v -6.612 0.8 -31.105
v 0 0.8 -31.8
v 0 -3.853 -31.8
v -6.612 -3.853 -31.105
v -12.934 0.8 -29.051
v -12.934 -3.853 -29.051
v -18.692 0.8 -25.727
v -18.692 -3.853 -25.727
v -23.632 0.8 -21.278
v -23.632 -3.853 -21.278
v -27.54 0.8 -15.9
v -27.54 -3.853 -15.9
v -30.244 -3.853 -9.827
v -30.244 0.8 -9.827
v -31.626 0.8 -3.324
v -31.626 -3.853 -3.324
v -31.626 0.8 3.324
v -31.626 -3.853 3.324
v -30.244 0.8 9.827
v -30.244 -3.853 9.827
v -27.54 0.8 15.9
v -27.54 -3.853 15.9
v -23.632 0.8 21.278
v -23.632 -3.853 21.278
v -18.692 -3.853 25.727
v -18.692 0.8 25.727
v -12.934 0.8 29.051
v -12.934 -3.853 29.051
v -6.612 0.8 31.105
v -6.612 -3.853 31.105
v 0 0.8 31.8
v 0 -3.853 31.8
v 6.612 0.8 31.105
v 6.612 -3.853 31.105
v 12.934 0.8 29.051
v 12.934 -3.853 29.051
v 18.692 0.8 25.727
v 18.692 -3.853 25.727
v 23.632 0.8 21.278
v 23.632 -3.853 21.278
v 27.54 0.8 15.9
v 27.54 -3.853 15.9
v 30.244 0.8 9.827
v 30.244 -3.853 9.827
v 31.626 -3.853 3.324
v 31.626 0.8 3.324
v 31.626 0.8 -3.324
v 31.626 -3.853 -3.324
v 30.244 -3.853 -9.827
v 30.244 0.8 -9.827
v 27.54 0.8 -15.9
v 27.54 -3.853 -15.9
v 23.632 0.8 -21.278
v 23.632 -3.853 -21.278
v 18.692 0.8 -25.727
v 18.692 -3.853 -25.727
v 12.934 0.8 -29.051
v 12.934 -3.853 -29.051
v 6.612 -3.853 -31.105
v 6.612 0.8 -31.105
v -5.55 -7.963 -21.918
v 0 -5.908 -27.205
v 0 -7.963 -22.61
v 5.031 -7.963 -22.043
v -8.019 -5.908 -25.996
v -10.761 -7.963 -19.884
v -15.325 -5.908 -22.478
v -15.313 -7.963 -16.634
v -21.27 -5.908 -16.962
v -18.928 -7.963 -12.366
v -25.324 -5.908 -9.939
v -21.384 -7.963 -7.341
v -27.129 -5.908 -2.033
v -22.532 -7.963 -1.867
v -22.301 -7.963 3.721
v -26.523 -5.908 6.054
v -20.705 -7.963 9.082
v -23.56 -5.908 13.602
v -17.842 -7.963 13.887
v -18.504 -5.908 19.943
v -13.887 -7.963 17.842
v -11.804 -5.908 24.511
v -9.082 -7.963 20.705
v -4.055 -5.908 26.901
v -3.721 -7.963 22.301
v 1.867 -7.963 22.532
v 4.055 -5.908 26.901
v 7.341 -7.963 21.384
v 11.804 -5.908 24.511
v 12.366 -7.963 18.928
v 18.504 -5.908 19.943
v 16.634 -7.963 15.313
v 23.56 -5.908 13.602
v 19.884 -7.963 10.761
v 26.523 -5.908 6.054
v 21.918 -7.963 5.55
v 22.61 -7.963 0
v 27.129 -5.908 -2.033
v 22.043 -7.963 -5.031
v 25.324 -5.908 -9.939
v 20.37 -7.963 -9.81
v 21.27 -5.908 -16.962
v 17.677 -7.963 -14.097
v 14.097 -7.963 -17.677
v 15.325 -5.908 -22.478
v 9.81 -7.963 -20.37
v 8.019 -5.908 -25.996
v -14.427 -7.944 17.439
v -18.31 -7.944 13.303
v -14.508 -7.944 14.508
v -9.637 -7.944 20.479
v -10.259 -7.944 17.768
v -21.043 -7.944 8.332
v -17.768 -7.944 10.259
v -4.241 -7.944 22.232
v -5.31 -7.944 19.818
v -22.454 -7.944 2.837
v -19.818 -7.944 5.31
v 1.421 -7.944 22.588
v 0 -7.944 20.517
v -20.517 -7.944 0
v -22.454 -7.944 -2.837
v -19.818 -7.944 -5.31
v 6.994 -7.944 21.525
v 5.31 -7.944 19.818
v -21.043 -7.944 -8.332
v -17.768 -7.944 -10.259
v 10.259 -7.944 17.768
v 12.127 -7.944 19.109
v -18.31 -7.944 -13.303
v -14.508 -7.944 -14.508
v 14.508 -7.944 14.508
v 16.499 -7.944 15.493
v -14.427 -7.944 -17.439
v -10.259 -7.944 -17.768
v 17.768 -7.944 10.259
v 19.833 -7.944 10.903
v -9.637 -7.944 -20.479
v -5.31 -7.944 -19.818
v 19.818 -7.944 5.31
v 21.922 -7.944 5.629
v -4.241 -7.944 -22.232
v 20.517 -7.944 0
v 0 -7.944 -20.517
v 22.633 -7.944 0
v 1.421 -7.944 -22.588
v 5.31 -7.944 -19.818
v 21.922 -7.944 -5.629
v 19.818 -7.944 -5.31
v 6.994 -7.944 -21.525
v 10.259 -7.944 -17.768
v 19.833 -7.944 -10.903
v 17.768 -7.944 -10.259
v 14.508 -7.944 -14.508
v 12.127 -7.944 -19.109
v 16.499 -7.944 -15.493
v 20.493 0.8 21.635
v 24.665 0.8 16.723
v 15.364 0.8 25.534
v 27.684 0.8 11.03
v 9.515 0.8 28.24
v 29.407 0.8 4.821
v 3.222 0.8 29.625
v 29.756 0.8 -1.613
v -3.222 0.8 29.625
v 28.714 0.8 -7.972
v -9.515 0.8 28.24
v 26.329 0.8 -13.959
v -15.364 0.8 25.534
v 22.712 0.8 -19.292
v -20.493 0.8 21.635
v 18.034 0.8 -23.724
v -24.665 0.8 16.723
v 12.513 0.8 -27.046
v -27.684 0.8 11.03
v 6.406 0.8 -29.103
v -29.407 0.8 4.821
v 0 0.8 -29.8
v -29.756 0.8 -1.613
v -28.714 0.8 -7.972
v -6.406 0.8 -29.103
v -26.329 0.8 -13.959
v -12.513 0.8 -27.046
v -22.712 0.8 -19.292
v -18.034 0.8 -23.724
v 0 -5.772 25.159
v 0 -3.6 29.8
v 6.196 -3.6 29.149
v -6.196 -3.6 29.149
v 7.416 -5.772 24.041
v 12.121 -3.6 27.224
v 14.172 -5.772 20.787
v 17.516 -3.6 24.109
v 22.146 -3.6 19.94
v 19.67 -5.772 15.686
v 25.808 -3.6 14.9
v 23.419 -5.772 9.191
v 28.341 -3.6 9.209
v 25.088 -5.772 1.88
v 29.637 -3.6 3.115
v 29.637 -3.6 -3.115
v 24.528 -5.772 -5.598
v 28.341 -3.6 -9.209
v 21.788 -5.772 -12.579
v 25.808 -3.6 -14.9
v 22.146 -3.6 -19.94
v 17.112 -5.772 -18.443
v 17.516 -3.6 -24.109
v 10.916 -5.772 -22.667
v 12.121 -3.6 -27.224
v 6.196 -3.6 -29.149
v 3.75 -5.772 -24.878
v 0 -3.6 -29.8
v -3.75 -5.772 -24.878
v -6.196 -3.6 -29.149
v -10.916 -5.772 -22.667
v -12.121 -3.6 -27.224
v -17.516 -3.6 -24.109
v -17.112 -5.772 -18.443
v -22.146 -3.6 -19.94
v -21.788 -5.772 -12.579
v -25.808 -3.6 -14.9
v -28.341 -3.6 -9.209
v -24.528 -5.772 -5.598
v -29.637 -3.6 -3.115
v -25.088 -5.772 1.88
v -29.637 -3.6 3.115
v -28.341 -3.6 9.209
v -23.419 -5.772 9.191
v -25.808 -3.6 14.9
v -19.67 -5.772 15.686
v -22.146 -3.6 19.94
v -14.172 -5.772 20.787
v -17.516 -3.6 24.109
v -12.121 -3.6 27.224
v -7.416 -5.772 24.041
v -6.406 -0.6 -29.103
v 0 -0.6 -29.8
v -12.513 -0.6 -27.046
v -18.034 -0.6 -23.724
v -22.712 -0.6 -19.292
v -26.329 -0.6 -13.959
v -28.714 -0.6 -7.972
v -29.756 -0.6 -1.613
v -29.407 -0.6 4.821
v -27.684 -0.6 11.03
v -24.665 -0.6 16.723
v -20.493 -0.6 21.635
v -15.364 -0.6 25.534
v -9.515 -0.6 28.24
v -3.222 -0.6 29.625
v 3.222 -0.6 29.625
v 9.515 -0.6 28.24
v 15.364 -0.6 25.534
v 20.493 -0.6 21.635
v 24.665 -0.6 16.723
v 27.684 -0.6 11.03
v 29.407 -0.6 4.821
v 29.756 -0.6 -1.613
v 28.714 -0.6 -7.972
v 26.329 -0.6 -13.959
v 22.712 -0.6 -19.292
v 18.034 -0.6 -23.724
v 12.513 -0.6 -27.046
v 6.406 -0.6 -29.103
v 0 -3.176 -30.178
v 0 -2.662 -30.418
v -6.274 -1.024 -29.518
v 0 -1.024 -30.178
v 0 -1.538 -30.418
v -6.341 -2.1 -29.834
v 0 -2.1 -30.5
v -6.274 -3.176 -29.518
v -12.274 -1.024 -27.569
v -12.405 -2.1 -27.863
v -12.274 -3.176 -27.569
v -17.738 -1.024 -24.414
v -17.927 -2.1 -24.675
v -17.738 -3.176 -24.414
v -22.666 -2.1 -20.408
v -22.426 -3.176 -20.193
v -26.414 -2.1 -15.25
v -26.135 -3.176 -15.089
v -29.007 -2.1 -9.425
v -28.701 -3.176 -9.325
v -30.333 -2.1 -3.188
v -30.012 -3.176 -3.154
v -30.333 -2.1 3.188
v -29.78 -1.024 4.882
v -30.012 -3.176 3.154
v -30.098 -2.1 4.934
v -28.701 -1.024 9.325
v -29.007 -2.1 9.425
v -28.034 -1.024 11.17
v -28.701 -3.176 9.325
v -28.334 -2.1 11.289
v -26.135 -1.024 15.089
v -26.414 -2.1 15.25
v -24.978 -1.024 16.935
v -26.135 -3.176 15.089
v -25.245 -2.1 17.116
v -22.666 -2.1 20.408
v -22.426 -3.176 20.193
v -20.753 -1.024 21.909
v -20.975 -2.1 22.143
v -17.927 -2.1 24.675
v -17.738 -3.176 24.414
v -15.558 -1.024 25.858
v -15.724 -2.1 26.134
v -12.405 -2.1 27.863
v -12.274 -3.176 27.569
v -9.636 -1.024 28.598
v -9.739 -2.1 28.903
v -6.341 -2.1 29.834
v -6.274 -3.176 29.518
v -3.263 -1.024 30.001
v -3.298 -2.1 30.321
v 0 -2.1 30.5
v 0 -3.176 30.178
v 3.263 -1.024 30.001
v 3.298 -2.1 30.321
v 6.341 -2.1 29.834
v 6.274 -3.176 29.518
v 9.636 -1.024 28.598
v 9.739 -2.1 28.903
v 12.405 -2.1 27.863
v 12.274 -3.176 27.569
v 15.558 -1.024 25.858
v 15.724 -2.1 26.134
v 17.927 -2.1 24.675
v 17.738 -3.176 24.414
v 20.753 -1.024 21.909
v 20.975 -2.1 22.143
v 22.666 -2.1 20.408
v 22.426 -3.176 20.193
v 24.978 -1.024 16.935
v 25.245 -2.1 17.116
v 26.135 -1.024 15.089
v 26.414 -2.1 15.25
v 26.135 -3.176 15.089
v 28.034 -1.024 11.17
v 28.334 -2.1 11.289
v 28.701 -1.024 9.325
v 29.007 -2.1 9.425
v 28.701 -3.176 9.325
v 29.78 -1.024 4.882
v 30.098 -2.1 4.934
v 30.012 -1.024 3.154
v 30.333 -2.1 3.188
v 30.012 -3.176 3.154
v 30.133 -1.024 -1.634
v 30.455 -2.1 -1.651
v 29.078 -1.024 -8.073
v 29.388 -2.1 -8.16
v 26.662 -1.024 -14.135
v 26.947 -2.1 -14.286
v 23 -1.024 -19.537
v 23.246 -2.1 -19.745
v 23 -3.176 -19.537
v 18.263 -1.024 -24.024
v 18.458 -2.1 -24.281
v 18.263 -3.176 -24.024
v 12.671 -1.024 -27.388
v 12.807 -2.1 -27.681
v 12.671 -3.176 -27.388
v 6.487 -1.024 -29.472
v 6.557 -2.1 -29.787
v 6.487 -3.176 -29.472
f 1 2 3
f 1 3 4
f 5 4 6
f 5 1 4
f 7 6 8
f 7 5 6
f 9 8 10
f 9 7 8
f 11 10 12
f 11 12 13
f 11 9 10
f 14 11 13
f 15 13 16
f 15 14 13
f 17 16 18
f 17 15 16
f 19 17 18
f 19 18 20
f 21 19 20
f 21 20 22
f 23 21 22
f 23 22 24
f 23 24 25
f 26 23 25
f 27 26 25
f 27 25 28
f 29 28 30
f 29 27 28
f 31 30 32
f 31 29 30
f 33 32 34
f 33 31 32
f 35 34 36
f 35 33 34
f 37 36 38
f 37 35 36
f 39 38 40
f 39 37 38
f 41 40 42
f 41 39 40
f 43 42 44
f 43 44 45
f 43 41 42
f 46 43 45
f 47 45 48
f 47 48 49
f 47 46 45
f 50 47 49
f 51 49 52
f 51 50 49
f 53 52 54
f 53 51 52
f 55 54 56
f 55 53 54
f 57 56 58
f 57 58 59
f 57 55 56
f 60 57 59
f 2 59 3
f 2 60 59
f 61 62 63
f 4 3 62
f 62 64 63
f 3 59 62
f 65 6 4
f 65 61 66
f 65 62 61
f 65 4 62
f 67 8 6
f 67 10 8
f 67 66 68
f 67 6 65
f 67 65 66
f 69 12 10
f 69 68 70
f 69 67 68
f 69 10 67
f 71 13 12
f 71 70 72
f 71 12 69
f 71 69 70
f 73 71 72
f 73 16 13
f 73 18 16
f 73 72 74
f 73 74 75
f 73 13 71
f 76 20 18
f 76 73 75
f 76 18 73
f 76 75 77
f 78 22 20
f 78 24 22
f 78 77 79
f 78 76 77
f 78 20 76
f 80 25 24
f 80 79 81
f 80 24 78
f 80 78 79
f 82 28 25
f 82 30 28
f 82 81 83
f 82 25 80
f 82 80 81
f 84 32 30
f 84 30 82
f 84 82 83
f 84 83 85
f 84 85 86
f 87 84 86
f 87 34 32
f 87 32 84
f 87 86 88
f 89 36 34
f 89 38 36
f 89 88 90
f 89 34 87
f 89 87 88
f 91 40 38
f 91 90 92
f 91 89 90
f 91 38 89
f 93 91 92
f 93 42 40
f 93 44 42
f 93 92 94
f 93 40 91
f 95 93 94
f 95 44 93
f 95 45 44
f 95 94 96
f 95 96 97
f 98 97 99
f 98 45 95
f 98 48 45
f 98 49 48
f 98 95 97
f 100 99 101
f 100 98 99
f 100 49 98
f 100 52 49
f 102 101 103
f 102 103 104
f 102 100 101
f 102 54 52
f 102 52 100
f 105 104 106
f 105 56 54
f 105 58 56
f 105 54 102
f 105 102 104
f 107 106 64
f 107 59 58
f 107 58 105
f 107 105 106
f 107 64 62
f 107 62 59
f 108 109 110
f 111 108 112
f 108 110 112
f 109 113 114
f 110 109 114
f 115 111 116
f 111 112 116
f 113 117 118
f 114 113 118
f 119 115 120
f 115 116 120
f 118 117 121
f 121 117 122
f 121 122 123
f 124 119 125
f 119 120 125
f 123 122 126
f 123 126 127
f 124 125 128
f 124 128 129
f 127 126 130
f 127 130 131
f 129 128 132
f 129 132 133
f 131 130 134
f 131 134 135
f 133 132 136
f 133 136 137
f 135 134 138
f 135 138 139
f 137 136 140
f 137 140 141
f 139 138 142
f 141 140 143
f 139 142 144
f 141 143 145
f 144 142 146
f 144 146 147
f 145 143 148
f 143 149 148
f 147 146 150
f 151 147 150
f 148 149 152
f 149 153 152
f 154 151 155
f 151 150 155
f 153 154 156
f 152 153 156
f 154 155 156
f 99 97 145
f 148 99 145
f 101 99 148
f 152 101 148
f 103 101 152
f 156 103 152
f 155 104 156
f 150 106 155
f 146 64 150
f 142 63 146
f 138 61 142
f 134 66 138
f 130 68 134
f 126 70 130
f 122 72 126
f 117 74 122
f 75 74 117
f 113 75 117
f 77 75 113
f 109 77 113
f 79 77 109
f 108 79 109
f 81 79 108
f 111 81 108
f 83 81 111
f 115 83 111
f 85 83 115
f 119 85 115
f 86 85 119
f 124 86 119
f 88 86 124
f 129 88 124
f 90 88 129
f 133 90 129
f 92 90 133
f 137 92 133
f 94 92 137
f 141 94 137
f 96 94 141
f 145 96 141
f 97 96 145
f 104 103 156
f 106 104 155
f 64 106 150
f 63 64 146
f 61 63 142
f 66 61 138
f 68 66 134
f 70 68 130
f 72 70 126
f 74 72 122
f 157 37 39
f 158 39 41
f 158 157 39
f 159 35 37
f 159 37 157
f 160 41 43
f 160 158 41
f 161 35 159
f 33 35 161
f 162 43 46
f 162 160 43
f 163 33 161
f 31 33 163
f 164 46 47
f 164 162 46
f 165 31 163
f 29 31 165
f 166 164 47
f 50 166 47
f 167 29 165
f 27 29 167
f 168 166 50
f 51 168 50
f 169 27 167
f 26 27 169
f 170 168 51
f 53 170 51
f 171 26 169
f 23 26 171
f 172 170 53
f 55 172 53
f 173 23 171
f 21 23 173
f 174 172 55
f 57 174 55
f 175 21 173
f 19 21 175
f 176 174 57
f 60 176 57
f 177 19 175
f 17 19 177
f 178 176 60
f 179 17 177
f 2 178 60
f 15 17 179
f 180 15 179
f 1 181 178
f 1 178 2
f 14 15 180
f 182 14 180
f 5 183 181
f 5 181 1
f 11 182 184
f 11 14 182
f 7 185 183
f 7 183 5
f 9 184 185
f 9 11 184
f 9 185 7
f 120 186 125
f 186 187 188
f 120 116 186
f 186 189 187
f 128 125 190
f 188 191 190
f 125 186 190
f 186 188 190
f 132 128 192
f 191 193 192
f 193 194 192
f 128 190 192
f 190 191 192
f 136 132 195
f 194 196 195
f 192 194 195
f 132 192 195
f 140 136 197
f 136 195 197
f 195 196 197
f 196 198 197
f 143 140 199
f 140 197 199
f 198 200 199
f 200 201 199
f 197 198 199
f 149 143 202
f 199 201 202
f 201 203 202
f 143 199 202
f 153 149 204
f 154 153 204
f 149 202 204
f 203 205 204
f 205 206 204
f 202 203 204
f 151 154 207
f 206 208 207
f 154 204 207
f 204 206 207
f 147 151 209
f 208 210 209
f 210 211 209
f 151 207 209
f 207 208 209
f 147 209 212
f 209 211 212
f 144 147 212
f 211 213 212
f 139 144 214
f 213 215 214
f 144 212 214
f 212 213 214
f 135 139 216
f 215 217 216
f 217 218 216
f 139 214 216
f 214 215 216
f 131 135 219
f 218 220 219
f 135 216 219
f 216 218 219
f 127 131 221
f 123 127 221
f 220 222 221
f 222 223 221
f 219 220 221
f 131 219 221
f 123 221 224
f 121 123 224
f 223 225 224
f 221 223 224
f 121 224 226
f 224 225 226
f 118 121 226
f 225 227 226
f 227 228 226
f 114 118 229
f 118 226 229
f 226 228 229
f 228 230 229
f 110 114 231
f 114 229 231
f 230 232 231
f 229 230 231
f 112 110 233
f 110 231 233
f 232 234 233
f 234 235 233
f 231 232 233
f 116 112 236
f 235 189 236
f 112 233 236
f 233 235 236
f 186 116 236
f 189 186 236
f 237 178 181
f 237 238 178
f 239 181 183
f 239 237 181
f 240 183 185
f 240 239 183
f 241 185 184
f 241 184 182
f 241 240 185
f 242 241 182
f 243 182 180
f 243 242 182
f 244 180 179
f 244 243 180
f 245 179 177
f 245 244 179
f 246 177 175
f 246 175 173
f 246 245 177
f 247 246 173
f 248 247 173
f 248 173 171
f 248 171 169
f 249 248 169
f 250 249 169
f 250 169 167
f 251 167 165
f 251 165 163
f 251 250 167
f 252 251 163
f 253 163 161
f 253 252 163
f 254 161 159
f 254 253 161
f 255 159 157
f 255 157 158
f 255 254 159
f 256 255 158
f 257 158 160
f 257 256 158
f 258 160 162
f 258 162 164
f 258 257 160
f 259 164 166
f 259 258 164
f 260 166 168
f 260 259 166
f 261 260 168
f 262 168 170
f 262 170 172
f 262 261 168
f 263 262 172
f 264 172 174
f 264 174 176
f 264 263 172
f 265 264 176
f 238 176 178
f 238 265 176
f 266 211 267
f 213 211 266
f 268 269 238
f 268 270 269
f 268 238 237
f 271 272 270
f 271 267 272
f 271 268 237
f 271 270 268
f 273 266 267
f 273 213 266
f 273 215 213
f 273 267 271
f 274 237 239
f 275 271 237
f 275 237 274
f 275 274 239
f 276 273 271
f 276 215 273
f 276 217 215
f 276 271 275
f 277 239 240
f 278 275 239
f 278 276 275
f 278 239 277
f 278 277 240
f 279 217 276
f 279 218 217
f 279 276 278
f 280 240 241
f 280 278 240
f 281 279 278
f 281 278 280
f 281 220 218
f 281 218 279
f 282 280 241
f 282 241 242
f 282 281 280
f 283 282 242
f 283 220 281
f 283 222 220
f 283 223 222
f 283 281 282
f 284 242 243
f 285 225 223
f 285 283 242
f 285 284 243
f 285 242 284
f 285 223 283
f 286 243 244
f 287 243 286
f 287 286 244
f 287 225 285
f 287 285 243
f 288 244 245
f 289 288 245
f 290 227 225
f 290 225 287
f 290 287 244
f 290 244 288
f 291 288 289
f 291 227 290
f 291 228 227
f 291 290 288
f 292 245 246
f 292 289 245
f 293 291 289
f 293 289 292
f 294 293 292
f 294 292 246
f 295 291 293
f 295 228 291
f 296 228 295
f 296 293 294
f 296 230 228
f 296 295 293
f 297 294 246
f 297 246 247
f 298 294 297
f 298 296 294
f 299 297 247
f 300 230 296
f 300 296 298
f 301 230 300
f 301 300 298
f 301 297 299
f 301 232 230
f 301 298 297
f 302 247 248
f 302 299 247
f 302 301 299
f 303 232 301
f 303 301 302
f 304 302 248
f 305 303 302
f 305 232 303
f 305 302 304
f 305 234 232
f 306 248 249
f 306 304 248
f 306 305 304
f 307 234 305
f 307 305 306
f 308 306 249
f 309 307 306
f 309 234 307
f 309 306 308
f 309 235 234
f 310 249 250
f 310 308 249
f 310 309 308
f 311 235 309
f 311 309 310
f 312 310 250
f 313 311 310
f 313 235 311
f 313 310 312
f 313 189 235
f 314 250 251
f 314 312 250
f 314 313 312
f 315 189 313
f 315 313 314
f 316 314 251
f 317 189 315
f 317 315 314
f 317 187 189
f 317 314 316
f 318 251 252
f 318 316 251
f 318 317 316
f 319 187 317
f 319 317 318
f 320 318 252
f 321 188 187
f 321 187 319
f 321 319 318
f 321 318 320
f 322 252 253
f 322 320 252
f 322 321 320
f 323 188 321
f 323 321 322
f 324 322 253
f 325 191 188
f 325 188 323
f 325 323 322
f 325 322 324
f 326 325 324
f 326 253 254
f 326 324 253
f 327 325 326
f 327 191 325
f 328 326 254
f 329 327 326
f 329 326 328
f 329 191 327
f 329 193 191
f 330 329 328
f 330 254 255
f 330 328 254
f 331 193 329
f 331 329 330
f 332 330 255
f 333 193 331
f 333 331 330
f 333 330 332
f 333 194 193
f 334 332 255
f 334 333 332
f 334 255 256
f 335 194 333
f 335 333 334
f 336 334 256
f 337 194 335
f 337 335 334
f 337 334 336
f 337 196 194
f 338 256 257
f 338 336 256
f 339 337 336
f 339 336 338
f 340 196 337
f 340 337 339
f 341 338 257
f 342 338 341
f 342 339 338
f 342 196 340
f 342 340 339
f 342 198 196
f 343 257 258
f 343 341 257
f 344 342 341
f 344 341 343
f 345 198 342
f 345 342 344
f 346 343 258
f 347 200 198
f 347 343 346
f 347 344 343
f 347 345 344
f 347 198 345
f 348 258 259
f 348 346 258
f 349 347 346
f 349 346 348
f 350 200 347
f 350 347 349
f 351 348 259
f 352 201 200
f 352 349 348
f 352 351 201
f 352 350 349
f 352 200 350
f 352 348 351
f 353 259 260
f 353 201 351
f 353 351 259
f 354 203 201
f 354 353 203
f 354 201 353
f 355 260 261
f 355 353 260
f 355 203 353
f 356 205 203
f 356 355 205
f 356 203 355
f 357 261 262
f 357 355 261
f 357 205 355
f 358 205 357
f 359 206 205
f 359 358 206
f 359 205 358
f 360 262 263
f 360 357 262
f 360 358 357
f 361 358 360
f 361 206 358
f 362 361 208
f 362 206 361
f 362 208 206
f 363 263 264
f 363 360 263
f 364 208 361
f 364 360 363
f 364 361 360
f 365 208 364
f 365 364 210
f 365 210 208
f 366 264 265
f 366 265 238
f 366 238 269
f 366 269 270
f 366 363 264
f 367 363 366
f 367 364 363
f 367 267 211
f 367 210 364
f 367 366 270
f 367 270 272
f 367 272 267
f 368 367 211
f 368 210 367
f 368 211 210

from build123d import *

# Parameters (mm, degrees)
SKETCH4_R          = 21
CUT_EXTRUDE1_DEPTH = 1.37
CUT_EXTRUDE1_DRAFT = -50
SKETCH5_W          = 2
SKETCH5_H          = 0.6


with BuildPart() as part:
    # Sketch3 → Revolve2 (revolve)
    with BuildSketch(Plane.XY, mode=Mode.PRIVATE) as revolve2_sk:
        with BuildLine():
            Line((-28, -2.8), (-28, -3.8))
            Line((-28, -3.8), (-21.291666667, -6.8))
            Line((-21.291666667, -6.8), (-19.589543983, -9.313904271))
            Line((-19.589543983, -9.313904271), (-31.8, -3.853327667))
            Line((-31.8, -3.853327667), (-31.8, 1.4))
            Line((-31.8, 1.4), (-29.8, 1.4))
            Line((-29.8, 1.4), (-29.8, -0.6))
            ThreePointArc((-29.8, -0.6), (-30.5, -2.1), (-29.8, -3.6))
            Line((-29.8, -3.6), (-29.8, -2.8))
            Line((-29.8, -2.8), (-28, -2.8))
        make_face()
    revolve(revolve2_sk.sketch.rotate(Axis((0, 0, 0), (0, 1, 0)), 270), axis=Axis((0, 0, 0), (0, 1, 0)))


with BuildPart() as cut_extrude1_tool:
    # Sketch4 → Cut-Extrude1 (with draft: the straight prism first)
    with BuildSketch(Plane(origin=(0, -9.313904271, 0), x_dir=(1, 0, 0), z_dir=(0, 1, 0))):
        Circle(SKETCH4_R)
    extrude(amount=CUT_EXTRUDE1_DEPTH)
    # Cut-Extrude1: the draft: its side faces are tilted about the plane it starts from
    cut_extrude1_sides = [cut_extrude1_tool.faces().sort_by_distance(p)[0] for p in [
        (-21, -8.628904271, 0),
    ]]
    draft(cut_extrude1_sides, Plane(origin=(0, -9.313904271, 0), x_dir=(1, 0, 0), z_dir=(0, 1, 0)), CUT_EXTRUDE1_DRAFT)


with BuildPart() as part_1:
    add(part.part)

    # Cut-Extrude1: cut by cut_extrude1_tool
    add(cut_extrude1_tool.part, mode=Mode.SUBTRACT)

    # Sketch5 → Cut-Revolve1 (revolve, cut)
    with BuildSketch(Plane.XY, mode=Mode.PRIVATE) as cut_revolve1_sk:
        with Locations((-30.8, 1.1)):
            Rectangle(SKETCH5_W, SKETCH5_H)
    revolve(cut_revolve1_sk.sketch.rotate(Axis((0, 0, 0), (0, 1, 0)), 270), axis=Axis((0, 0, 0), (0, 1, 0)), mode=Mode.SUBTRACT)

    # Sketch6 → Cut-Revolve2 (revolve, cut)
    with BuildSketch(Plane.XY, mode=Mode.PRIVATE) as cut_revolve2_sk:
        Polygon((-28, -3.8), (-29.8, -2.8), (-28, -2.8), align=None)
    revolve(cut_revolve2_sk.sketch.rotate(Axis((0, 0, 0), (0, 1, 0)), 90), axis=Axis((0, 0, 0), (0, 1, 0)), mode=Mode.SUBTRACT)

    # Sketch7 → Cut-Revolve3 (revolve, cut)
    with BuildSketch(Plane.XY, mode=Mode.PRIVATE) as cut_revolve3_sk:
        Polygon((-28, -3.8), (-21.291666667, -6.8), (-20.51714815, -7.943904271), (-29.8, -3.6), (-29.8, -2.8), align=None)
    revolve(cut_revolve3_sk.sketch.rotate(Axis((0, 0, 0), (0, 1, 0)), 90), axis=Axis((0, 0, 0), (0, 1, 0)), mode=Mode.SUBTRACT)


solid = part_1.part
